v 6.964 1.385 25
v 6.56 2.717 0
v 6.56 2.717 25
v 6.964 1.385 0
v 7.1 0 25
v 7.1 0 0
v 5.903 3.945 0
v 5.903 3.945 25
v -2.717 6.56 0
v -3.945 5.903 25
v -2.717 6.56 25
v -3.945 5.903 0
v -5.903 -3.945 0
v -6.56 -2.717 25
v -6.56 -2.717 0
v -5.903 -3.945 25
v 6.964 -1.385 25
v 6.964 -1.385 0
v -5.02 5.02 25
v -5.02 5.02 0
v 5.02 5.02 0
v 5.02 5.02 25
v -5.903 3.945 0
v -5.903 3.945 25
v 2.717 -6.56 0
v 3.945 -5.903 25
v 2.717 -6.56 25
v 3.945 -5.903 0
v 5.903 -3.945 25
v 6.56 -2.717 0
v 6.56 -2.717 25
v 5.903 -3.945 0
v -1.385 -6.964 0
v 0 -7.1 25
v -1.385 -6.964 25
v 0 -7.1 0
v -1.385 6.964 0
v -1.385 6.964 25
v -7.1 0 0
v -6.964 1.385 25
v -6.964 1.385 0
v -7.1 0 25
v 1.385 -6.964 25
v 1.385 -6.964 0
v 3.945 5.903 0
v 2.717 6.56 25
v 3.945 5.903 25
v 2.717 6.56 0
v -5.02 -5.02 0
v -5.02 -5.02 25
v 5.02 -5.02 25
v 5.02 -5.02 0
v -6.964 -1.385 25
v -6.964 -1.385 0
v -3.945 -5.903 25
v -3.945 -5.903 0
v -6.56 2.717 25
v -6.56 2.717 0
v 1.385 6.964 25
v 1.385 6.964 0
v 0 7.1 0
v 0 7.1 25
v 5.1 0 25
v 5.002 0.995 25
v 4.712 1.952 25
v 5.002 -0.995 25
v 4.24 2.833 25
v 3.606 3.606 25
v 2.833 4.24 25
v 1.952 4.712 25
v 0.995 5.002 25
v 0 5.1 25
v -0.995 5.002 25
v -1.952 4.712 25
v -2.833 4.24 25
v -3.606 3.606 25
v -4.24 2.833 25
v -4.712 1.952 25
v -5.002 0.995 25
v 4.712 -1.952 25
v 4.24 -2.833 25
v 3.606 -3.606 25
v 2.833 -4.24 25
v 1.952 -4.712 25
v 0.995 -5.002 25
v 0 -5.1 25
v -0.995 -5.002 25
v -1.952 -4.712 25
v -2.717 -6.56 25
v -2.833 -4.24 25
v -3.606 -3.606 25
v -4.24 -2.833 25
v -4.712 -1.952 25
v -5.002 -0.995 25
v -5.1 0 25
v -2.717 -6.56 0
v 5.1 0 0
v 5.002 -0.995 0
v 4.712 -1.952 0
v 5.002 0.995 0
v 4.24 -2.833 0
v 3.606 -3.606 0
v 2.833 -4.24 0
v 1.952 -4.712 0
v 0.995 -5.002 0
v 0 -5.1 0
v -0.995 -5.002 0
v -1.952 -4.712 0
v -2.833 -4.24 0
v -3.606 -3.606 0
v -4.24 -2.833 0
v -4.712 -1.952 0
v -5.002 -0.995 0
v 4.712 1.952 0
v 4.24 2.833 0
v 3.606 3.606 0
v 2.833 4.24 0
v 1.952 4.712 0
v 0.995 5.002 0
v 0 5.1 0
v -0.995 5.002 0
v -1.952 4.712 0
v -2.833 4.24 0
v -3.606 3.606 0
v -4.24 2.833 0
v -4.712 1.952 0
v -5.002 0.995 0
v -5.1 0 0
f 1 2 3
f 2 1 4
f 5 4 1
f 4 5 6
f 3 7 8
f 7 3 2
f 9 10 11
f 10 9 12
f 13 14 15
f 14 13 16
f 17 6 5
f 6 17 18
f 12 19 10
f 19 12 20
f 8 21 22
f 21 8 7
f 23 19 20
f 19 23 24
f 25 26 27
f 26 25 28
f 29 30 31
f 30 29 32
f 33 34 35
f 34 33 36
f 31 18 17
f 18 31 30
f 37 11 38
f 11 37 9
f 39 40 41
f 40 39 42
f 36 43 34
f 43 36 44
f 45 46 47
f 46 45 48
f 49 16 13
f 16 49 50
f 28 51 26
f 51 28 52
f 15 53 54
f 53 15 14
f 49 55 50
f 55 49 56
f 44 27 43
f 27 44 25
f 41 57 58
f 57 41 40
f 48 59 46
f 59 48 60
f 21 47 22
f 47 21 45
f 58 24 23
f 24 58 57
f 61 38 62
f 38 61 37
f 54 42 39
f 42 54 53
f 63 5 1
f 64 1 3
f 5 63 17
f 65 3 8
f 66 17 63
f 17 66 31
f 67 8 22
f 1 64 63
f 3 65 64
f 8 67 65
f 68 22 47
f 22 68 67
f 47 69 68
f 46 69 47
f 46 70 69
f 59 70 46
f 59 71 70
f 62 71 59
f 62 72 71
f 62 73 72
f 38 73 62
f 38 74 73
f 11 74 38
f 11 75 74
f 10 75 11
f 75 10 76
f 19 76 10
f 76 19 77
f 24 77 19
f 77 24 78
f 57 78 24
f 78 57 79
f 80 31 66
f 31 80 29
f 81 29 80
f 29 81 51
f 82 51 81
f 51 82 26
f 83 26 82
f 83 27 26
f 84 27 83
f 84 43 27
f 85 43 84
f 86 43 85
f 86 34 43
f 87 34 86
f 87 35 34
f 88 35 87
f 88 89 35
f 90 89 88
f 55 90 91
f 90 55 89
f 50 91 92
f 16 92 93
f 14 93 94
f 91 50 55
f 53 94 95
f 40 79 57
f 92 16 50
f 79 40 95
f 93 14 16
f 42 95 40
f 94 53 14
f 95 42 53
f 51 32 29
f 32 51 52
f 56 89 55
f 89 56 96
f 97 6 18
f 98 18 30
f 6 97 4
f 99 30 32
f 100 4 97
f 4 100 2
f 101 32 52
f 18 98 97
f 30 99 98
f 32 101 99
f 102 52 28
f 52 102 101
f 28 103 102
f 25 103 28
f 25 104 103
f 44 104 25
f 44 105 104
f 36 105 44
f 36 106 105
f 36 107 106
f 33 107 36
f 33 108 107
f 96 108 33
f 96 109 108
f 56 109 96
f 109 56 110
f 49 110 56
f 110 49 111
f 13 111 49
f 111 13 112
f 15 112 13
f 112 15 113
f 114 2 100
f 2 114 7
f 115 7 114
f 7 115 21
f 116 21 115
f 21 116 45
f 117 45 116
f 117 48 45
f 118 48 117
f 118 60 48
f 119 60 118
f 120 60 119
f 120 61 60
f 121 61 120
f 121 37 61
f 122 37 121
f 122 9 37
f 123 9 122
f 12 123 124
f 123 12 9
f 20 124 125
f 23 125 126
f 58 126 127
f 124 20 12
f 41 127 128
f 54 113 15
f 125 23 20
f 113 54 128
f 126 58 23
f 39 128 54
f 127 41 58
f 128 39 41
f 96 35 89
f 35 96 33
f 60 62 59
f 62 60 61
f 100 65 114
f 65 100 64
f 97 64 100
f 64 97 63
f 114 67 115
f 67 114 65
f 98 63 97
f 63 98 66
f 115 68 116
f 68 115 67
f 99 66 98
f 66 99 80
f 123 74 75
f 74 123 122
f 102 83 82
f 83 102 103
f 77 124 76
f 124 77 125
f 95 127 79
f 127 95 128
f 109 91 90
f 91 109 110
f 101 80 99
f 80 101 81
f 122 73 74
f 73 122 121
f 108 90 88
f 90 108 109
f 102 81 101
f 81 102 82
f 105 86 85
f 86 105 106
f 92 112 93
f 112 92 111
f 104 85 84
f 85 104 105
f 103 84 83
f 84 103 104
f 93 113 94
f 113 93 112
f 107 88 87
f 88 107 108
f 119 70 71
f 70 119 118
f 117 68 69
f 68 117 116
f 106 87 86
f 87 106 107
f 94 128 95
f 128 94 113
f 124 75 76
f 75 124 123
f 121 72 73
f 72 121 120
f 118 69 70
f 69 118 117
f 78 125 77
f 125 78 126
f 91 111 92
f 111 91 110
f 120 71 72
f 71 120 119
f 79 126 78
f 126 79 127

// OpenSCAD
$fn = 32;

// ----------------------------------------------------------------------
// Spacer sleeve: 14.2 / 10.2 x 25 mm
// ----------------------------------------------------------------------

// --- parameters (mm) ---
outer_d = 14.2;           // outside diameter
inner_d = 10.2;           // shaft bore
length = 25;              // sleeve length

module sleeve() {
  cylinder(h = length, d = outer_d);
}

difference() {
  sleeve();
  translate([0, 0, -1]) cylinder(h = length + 2, d = inner_d);
}
